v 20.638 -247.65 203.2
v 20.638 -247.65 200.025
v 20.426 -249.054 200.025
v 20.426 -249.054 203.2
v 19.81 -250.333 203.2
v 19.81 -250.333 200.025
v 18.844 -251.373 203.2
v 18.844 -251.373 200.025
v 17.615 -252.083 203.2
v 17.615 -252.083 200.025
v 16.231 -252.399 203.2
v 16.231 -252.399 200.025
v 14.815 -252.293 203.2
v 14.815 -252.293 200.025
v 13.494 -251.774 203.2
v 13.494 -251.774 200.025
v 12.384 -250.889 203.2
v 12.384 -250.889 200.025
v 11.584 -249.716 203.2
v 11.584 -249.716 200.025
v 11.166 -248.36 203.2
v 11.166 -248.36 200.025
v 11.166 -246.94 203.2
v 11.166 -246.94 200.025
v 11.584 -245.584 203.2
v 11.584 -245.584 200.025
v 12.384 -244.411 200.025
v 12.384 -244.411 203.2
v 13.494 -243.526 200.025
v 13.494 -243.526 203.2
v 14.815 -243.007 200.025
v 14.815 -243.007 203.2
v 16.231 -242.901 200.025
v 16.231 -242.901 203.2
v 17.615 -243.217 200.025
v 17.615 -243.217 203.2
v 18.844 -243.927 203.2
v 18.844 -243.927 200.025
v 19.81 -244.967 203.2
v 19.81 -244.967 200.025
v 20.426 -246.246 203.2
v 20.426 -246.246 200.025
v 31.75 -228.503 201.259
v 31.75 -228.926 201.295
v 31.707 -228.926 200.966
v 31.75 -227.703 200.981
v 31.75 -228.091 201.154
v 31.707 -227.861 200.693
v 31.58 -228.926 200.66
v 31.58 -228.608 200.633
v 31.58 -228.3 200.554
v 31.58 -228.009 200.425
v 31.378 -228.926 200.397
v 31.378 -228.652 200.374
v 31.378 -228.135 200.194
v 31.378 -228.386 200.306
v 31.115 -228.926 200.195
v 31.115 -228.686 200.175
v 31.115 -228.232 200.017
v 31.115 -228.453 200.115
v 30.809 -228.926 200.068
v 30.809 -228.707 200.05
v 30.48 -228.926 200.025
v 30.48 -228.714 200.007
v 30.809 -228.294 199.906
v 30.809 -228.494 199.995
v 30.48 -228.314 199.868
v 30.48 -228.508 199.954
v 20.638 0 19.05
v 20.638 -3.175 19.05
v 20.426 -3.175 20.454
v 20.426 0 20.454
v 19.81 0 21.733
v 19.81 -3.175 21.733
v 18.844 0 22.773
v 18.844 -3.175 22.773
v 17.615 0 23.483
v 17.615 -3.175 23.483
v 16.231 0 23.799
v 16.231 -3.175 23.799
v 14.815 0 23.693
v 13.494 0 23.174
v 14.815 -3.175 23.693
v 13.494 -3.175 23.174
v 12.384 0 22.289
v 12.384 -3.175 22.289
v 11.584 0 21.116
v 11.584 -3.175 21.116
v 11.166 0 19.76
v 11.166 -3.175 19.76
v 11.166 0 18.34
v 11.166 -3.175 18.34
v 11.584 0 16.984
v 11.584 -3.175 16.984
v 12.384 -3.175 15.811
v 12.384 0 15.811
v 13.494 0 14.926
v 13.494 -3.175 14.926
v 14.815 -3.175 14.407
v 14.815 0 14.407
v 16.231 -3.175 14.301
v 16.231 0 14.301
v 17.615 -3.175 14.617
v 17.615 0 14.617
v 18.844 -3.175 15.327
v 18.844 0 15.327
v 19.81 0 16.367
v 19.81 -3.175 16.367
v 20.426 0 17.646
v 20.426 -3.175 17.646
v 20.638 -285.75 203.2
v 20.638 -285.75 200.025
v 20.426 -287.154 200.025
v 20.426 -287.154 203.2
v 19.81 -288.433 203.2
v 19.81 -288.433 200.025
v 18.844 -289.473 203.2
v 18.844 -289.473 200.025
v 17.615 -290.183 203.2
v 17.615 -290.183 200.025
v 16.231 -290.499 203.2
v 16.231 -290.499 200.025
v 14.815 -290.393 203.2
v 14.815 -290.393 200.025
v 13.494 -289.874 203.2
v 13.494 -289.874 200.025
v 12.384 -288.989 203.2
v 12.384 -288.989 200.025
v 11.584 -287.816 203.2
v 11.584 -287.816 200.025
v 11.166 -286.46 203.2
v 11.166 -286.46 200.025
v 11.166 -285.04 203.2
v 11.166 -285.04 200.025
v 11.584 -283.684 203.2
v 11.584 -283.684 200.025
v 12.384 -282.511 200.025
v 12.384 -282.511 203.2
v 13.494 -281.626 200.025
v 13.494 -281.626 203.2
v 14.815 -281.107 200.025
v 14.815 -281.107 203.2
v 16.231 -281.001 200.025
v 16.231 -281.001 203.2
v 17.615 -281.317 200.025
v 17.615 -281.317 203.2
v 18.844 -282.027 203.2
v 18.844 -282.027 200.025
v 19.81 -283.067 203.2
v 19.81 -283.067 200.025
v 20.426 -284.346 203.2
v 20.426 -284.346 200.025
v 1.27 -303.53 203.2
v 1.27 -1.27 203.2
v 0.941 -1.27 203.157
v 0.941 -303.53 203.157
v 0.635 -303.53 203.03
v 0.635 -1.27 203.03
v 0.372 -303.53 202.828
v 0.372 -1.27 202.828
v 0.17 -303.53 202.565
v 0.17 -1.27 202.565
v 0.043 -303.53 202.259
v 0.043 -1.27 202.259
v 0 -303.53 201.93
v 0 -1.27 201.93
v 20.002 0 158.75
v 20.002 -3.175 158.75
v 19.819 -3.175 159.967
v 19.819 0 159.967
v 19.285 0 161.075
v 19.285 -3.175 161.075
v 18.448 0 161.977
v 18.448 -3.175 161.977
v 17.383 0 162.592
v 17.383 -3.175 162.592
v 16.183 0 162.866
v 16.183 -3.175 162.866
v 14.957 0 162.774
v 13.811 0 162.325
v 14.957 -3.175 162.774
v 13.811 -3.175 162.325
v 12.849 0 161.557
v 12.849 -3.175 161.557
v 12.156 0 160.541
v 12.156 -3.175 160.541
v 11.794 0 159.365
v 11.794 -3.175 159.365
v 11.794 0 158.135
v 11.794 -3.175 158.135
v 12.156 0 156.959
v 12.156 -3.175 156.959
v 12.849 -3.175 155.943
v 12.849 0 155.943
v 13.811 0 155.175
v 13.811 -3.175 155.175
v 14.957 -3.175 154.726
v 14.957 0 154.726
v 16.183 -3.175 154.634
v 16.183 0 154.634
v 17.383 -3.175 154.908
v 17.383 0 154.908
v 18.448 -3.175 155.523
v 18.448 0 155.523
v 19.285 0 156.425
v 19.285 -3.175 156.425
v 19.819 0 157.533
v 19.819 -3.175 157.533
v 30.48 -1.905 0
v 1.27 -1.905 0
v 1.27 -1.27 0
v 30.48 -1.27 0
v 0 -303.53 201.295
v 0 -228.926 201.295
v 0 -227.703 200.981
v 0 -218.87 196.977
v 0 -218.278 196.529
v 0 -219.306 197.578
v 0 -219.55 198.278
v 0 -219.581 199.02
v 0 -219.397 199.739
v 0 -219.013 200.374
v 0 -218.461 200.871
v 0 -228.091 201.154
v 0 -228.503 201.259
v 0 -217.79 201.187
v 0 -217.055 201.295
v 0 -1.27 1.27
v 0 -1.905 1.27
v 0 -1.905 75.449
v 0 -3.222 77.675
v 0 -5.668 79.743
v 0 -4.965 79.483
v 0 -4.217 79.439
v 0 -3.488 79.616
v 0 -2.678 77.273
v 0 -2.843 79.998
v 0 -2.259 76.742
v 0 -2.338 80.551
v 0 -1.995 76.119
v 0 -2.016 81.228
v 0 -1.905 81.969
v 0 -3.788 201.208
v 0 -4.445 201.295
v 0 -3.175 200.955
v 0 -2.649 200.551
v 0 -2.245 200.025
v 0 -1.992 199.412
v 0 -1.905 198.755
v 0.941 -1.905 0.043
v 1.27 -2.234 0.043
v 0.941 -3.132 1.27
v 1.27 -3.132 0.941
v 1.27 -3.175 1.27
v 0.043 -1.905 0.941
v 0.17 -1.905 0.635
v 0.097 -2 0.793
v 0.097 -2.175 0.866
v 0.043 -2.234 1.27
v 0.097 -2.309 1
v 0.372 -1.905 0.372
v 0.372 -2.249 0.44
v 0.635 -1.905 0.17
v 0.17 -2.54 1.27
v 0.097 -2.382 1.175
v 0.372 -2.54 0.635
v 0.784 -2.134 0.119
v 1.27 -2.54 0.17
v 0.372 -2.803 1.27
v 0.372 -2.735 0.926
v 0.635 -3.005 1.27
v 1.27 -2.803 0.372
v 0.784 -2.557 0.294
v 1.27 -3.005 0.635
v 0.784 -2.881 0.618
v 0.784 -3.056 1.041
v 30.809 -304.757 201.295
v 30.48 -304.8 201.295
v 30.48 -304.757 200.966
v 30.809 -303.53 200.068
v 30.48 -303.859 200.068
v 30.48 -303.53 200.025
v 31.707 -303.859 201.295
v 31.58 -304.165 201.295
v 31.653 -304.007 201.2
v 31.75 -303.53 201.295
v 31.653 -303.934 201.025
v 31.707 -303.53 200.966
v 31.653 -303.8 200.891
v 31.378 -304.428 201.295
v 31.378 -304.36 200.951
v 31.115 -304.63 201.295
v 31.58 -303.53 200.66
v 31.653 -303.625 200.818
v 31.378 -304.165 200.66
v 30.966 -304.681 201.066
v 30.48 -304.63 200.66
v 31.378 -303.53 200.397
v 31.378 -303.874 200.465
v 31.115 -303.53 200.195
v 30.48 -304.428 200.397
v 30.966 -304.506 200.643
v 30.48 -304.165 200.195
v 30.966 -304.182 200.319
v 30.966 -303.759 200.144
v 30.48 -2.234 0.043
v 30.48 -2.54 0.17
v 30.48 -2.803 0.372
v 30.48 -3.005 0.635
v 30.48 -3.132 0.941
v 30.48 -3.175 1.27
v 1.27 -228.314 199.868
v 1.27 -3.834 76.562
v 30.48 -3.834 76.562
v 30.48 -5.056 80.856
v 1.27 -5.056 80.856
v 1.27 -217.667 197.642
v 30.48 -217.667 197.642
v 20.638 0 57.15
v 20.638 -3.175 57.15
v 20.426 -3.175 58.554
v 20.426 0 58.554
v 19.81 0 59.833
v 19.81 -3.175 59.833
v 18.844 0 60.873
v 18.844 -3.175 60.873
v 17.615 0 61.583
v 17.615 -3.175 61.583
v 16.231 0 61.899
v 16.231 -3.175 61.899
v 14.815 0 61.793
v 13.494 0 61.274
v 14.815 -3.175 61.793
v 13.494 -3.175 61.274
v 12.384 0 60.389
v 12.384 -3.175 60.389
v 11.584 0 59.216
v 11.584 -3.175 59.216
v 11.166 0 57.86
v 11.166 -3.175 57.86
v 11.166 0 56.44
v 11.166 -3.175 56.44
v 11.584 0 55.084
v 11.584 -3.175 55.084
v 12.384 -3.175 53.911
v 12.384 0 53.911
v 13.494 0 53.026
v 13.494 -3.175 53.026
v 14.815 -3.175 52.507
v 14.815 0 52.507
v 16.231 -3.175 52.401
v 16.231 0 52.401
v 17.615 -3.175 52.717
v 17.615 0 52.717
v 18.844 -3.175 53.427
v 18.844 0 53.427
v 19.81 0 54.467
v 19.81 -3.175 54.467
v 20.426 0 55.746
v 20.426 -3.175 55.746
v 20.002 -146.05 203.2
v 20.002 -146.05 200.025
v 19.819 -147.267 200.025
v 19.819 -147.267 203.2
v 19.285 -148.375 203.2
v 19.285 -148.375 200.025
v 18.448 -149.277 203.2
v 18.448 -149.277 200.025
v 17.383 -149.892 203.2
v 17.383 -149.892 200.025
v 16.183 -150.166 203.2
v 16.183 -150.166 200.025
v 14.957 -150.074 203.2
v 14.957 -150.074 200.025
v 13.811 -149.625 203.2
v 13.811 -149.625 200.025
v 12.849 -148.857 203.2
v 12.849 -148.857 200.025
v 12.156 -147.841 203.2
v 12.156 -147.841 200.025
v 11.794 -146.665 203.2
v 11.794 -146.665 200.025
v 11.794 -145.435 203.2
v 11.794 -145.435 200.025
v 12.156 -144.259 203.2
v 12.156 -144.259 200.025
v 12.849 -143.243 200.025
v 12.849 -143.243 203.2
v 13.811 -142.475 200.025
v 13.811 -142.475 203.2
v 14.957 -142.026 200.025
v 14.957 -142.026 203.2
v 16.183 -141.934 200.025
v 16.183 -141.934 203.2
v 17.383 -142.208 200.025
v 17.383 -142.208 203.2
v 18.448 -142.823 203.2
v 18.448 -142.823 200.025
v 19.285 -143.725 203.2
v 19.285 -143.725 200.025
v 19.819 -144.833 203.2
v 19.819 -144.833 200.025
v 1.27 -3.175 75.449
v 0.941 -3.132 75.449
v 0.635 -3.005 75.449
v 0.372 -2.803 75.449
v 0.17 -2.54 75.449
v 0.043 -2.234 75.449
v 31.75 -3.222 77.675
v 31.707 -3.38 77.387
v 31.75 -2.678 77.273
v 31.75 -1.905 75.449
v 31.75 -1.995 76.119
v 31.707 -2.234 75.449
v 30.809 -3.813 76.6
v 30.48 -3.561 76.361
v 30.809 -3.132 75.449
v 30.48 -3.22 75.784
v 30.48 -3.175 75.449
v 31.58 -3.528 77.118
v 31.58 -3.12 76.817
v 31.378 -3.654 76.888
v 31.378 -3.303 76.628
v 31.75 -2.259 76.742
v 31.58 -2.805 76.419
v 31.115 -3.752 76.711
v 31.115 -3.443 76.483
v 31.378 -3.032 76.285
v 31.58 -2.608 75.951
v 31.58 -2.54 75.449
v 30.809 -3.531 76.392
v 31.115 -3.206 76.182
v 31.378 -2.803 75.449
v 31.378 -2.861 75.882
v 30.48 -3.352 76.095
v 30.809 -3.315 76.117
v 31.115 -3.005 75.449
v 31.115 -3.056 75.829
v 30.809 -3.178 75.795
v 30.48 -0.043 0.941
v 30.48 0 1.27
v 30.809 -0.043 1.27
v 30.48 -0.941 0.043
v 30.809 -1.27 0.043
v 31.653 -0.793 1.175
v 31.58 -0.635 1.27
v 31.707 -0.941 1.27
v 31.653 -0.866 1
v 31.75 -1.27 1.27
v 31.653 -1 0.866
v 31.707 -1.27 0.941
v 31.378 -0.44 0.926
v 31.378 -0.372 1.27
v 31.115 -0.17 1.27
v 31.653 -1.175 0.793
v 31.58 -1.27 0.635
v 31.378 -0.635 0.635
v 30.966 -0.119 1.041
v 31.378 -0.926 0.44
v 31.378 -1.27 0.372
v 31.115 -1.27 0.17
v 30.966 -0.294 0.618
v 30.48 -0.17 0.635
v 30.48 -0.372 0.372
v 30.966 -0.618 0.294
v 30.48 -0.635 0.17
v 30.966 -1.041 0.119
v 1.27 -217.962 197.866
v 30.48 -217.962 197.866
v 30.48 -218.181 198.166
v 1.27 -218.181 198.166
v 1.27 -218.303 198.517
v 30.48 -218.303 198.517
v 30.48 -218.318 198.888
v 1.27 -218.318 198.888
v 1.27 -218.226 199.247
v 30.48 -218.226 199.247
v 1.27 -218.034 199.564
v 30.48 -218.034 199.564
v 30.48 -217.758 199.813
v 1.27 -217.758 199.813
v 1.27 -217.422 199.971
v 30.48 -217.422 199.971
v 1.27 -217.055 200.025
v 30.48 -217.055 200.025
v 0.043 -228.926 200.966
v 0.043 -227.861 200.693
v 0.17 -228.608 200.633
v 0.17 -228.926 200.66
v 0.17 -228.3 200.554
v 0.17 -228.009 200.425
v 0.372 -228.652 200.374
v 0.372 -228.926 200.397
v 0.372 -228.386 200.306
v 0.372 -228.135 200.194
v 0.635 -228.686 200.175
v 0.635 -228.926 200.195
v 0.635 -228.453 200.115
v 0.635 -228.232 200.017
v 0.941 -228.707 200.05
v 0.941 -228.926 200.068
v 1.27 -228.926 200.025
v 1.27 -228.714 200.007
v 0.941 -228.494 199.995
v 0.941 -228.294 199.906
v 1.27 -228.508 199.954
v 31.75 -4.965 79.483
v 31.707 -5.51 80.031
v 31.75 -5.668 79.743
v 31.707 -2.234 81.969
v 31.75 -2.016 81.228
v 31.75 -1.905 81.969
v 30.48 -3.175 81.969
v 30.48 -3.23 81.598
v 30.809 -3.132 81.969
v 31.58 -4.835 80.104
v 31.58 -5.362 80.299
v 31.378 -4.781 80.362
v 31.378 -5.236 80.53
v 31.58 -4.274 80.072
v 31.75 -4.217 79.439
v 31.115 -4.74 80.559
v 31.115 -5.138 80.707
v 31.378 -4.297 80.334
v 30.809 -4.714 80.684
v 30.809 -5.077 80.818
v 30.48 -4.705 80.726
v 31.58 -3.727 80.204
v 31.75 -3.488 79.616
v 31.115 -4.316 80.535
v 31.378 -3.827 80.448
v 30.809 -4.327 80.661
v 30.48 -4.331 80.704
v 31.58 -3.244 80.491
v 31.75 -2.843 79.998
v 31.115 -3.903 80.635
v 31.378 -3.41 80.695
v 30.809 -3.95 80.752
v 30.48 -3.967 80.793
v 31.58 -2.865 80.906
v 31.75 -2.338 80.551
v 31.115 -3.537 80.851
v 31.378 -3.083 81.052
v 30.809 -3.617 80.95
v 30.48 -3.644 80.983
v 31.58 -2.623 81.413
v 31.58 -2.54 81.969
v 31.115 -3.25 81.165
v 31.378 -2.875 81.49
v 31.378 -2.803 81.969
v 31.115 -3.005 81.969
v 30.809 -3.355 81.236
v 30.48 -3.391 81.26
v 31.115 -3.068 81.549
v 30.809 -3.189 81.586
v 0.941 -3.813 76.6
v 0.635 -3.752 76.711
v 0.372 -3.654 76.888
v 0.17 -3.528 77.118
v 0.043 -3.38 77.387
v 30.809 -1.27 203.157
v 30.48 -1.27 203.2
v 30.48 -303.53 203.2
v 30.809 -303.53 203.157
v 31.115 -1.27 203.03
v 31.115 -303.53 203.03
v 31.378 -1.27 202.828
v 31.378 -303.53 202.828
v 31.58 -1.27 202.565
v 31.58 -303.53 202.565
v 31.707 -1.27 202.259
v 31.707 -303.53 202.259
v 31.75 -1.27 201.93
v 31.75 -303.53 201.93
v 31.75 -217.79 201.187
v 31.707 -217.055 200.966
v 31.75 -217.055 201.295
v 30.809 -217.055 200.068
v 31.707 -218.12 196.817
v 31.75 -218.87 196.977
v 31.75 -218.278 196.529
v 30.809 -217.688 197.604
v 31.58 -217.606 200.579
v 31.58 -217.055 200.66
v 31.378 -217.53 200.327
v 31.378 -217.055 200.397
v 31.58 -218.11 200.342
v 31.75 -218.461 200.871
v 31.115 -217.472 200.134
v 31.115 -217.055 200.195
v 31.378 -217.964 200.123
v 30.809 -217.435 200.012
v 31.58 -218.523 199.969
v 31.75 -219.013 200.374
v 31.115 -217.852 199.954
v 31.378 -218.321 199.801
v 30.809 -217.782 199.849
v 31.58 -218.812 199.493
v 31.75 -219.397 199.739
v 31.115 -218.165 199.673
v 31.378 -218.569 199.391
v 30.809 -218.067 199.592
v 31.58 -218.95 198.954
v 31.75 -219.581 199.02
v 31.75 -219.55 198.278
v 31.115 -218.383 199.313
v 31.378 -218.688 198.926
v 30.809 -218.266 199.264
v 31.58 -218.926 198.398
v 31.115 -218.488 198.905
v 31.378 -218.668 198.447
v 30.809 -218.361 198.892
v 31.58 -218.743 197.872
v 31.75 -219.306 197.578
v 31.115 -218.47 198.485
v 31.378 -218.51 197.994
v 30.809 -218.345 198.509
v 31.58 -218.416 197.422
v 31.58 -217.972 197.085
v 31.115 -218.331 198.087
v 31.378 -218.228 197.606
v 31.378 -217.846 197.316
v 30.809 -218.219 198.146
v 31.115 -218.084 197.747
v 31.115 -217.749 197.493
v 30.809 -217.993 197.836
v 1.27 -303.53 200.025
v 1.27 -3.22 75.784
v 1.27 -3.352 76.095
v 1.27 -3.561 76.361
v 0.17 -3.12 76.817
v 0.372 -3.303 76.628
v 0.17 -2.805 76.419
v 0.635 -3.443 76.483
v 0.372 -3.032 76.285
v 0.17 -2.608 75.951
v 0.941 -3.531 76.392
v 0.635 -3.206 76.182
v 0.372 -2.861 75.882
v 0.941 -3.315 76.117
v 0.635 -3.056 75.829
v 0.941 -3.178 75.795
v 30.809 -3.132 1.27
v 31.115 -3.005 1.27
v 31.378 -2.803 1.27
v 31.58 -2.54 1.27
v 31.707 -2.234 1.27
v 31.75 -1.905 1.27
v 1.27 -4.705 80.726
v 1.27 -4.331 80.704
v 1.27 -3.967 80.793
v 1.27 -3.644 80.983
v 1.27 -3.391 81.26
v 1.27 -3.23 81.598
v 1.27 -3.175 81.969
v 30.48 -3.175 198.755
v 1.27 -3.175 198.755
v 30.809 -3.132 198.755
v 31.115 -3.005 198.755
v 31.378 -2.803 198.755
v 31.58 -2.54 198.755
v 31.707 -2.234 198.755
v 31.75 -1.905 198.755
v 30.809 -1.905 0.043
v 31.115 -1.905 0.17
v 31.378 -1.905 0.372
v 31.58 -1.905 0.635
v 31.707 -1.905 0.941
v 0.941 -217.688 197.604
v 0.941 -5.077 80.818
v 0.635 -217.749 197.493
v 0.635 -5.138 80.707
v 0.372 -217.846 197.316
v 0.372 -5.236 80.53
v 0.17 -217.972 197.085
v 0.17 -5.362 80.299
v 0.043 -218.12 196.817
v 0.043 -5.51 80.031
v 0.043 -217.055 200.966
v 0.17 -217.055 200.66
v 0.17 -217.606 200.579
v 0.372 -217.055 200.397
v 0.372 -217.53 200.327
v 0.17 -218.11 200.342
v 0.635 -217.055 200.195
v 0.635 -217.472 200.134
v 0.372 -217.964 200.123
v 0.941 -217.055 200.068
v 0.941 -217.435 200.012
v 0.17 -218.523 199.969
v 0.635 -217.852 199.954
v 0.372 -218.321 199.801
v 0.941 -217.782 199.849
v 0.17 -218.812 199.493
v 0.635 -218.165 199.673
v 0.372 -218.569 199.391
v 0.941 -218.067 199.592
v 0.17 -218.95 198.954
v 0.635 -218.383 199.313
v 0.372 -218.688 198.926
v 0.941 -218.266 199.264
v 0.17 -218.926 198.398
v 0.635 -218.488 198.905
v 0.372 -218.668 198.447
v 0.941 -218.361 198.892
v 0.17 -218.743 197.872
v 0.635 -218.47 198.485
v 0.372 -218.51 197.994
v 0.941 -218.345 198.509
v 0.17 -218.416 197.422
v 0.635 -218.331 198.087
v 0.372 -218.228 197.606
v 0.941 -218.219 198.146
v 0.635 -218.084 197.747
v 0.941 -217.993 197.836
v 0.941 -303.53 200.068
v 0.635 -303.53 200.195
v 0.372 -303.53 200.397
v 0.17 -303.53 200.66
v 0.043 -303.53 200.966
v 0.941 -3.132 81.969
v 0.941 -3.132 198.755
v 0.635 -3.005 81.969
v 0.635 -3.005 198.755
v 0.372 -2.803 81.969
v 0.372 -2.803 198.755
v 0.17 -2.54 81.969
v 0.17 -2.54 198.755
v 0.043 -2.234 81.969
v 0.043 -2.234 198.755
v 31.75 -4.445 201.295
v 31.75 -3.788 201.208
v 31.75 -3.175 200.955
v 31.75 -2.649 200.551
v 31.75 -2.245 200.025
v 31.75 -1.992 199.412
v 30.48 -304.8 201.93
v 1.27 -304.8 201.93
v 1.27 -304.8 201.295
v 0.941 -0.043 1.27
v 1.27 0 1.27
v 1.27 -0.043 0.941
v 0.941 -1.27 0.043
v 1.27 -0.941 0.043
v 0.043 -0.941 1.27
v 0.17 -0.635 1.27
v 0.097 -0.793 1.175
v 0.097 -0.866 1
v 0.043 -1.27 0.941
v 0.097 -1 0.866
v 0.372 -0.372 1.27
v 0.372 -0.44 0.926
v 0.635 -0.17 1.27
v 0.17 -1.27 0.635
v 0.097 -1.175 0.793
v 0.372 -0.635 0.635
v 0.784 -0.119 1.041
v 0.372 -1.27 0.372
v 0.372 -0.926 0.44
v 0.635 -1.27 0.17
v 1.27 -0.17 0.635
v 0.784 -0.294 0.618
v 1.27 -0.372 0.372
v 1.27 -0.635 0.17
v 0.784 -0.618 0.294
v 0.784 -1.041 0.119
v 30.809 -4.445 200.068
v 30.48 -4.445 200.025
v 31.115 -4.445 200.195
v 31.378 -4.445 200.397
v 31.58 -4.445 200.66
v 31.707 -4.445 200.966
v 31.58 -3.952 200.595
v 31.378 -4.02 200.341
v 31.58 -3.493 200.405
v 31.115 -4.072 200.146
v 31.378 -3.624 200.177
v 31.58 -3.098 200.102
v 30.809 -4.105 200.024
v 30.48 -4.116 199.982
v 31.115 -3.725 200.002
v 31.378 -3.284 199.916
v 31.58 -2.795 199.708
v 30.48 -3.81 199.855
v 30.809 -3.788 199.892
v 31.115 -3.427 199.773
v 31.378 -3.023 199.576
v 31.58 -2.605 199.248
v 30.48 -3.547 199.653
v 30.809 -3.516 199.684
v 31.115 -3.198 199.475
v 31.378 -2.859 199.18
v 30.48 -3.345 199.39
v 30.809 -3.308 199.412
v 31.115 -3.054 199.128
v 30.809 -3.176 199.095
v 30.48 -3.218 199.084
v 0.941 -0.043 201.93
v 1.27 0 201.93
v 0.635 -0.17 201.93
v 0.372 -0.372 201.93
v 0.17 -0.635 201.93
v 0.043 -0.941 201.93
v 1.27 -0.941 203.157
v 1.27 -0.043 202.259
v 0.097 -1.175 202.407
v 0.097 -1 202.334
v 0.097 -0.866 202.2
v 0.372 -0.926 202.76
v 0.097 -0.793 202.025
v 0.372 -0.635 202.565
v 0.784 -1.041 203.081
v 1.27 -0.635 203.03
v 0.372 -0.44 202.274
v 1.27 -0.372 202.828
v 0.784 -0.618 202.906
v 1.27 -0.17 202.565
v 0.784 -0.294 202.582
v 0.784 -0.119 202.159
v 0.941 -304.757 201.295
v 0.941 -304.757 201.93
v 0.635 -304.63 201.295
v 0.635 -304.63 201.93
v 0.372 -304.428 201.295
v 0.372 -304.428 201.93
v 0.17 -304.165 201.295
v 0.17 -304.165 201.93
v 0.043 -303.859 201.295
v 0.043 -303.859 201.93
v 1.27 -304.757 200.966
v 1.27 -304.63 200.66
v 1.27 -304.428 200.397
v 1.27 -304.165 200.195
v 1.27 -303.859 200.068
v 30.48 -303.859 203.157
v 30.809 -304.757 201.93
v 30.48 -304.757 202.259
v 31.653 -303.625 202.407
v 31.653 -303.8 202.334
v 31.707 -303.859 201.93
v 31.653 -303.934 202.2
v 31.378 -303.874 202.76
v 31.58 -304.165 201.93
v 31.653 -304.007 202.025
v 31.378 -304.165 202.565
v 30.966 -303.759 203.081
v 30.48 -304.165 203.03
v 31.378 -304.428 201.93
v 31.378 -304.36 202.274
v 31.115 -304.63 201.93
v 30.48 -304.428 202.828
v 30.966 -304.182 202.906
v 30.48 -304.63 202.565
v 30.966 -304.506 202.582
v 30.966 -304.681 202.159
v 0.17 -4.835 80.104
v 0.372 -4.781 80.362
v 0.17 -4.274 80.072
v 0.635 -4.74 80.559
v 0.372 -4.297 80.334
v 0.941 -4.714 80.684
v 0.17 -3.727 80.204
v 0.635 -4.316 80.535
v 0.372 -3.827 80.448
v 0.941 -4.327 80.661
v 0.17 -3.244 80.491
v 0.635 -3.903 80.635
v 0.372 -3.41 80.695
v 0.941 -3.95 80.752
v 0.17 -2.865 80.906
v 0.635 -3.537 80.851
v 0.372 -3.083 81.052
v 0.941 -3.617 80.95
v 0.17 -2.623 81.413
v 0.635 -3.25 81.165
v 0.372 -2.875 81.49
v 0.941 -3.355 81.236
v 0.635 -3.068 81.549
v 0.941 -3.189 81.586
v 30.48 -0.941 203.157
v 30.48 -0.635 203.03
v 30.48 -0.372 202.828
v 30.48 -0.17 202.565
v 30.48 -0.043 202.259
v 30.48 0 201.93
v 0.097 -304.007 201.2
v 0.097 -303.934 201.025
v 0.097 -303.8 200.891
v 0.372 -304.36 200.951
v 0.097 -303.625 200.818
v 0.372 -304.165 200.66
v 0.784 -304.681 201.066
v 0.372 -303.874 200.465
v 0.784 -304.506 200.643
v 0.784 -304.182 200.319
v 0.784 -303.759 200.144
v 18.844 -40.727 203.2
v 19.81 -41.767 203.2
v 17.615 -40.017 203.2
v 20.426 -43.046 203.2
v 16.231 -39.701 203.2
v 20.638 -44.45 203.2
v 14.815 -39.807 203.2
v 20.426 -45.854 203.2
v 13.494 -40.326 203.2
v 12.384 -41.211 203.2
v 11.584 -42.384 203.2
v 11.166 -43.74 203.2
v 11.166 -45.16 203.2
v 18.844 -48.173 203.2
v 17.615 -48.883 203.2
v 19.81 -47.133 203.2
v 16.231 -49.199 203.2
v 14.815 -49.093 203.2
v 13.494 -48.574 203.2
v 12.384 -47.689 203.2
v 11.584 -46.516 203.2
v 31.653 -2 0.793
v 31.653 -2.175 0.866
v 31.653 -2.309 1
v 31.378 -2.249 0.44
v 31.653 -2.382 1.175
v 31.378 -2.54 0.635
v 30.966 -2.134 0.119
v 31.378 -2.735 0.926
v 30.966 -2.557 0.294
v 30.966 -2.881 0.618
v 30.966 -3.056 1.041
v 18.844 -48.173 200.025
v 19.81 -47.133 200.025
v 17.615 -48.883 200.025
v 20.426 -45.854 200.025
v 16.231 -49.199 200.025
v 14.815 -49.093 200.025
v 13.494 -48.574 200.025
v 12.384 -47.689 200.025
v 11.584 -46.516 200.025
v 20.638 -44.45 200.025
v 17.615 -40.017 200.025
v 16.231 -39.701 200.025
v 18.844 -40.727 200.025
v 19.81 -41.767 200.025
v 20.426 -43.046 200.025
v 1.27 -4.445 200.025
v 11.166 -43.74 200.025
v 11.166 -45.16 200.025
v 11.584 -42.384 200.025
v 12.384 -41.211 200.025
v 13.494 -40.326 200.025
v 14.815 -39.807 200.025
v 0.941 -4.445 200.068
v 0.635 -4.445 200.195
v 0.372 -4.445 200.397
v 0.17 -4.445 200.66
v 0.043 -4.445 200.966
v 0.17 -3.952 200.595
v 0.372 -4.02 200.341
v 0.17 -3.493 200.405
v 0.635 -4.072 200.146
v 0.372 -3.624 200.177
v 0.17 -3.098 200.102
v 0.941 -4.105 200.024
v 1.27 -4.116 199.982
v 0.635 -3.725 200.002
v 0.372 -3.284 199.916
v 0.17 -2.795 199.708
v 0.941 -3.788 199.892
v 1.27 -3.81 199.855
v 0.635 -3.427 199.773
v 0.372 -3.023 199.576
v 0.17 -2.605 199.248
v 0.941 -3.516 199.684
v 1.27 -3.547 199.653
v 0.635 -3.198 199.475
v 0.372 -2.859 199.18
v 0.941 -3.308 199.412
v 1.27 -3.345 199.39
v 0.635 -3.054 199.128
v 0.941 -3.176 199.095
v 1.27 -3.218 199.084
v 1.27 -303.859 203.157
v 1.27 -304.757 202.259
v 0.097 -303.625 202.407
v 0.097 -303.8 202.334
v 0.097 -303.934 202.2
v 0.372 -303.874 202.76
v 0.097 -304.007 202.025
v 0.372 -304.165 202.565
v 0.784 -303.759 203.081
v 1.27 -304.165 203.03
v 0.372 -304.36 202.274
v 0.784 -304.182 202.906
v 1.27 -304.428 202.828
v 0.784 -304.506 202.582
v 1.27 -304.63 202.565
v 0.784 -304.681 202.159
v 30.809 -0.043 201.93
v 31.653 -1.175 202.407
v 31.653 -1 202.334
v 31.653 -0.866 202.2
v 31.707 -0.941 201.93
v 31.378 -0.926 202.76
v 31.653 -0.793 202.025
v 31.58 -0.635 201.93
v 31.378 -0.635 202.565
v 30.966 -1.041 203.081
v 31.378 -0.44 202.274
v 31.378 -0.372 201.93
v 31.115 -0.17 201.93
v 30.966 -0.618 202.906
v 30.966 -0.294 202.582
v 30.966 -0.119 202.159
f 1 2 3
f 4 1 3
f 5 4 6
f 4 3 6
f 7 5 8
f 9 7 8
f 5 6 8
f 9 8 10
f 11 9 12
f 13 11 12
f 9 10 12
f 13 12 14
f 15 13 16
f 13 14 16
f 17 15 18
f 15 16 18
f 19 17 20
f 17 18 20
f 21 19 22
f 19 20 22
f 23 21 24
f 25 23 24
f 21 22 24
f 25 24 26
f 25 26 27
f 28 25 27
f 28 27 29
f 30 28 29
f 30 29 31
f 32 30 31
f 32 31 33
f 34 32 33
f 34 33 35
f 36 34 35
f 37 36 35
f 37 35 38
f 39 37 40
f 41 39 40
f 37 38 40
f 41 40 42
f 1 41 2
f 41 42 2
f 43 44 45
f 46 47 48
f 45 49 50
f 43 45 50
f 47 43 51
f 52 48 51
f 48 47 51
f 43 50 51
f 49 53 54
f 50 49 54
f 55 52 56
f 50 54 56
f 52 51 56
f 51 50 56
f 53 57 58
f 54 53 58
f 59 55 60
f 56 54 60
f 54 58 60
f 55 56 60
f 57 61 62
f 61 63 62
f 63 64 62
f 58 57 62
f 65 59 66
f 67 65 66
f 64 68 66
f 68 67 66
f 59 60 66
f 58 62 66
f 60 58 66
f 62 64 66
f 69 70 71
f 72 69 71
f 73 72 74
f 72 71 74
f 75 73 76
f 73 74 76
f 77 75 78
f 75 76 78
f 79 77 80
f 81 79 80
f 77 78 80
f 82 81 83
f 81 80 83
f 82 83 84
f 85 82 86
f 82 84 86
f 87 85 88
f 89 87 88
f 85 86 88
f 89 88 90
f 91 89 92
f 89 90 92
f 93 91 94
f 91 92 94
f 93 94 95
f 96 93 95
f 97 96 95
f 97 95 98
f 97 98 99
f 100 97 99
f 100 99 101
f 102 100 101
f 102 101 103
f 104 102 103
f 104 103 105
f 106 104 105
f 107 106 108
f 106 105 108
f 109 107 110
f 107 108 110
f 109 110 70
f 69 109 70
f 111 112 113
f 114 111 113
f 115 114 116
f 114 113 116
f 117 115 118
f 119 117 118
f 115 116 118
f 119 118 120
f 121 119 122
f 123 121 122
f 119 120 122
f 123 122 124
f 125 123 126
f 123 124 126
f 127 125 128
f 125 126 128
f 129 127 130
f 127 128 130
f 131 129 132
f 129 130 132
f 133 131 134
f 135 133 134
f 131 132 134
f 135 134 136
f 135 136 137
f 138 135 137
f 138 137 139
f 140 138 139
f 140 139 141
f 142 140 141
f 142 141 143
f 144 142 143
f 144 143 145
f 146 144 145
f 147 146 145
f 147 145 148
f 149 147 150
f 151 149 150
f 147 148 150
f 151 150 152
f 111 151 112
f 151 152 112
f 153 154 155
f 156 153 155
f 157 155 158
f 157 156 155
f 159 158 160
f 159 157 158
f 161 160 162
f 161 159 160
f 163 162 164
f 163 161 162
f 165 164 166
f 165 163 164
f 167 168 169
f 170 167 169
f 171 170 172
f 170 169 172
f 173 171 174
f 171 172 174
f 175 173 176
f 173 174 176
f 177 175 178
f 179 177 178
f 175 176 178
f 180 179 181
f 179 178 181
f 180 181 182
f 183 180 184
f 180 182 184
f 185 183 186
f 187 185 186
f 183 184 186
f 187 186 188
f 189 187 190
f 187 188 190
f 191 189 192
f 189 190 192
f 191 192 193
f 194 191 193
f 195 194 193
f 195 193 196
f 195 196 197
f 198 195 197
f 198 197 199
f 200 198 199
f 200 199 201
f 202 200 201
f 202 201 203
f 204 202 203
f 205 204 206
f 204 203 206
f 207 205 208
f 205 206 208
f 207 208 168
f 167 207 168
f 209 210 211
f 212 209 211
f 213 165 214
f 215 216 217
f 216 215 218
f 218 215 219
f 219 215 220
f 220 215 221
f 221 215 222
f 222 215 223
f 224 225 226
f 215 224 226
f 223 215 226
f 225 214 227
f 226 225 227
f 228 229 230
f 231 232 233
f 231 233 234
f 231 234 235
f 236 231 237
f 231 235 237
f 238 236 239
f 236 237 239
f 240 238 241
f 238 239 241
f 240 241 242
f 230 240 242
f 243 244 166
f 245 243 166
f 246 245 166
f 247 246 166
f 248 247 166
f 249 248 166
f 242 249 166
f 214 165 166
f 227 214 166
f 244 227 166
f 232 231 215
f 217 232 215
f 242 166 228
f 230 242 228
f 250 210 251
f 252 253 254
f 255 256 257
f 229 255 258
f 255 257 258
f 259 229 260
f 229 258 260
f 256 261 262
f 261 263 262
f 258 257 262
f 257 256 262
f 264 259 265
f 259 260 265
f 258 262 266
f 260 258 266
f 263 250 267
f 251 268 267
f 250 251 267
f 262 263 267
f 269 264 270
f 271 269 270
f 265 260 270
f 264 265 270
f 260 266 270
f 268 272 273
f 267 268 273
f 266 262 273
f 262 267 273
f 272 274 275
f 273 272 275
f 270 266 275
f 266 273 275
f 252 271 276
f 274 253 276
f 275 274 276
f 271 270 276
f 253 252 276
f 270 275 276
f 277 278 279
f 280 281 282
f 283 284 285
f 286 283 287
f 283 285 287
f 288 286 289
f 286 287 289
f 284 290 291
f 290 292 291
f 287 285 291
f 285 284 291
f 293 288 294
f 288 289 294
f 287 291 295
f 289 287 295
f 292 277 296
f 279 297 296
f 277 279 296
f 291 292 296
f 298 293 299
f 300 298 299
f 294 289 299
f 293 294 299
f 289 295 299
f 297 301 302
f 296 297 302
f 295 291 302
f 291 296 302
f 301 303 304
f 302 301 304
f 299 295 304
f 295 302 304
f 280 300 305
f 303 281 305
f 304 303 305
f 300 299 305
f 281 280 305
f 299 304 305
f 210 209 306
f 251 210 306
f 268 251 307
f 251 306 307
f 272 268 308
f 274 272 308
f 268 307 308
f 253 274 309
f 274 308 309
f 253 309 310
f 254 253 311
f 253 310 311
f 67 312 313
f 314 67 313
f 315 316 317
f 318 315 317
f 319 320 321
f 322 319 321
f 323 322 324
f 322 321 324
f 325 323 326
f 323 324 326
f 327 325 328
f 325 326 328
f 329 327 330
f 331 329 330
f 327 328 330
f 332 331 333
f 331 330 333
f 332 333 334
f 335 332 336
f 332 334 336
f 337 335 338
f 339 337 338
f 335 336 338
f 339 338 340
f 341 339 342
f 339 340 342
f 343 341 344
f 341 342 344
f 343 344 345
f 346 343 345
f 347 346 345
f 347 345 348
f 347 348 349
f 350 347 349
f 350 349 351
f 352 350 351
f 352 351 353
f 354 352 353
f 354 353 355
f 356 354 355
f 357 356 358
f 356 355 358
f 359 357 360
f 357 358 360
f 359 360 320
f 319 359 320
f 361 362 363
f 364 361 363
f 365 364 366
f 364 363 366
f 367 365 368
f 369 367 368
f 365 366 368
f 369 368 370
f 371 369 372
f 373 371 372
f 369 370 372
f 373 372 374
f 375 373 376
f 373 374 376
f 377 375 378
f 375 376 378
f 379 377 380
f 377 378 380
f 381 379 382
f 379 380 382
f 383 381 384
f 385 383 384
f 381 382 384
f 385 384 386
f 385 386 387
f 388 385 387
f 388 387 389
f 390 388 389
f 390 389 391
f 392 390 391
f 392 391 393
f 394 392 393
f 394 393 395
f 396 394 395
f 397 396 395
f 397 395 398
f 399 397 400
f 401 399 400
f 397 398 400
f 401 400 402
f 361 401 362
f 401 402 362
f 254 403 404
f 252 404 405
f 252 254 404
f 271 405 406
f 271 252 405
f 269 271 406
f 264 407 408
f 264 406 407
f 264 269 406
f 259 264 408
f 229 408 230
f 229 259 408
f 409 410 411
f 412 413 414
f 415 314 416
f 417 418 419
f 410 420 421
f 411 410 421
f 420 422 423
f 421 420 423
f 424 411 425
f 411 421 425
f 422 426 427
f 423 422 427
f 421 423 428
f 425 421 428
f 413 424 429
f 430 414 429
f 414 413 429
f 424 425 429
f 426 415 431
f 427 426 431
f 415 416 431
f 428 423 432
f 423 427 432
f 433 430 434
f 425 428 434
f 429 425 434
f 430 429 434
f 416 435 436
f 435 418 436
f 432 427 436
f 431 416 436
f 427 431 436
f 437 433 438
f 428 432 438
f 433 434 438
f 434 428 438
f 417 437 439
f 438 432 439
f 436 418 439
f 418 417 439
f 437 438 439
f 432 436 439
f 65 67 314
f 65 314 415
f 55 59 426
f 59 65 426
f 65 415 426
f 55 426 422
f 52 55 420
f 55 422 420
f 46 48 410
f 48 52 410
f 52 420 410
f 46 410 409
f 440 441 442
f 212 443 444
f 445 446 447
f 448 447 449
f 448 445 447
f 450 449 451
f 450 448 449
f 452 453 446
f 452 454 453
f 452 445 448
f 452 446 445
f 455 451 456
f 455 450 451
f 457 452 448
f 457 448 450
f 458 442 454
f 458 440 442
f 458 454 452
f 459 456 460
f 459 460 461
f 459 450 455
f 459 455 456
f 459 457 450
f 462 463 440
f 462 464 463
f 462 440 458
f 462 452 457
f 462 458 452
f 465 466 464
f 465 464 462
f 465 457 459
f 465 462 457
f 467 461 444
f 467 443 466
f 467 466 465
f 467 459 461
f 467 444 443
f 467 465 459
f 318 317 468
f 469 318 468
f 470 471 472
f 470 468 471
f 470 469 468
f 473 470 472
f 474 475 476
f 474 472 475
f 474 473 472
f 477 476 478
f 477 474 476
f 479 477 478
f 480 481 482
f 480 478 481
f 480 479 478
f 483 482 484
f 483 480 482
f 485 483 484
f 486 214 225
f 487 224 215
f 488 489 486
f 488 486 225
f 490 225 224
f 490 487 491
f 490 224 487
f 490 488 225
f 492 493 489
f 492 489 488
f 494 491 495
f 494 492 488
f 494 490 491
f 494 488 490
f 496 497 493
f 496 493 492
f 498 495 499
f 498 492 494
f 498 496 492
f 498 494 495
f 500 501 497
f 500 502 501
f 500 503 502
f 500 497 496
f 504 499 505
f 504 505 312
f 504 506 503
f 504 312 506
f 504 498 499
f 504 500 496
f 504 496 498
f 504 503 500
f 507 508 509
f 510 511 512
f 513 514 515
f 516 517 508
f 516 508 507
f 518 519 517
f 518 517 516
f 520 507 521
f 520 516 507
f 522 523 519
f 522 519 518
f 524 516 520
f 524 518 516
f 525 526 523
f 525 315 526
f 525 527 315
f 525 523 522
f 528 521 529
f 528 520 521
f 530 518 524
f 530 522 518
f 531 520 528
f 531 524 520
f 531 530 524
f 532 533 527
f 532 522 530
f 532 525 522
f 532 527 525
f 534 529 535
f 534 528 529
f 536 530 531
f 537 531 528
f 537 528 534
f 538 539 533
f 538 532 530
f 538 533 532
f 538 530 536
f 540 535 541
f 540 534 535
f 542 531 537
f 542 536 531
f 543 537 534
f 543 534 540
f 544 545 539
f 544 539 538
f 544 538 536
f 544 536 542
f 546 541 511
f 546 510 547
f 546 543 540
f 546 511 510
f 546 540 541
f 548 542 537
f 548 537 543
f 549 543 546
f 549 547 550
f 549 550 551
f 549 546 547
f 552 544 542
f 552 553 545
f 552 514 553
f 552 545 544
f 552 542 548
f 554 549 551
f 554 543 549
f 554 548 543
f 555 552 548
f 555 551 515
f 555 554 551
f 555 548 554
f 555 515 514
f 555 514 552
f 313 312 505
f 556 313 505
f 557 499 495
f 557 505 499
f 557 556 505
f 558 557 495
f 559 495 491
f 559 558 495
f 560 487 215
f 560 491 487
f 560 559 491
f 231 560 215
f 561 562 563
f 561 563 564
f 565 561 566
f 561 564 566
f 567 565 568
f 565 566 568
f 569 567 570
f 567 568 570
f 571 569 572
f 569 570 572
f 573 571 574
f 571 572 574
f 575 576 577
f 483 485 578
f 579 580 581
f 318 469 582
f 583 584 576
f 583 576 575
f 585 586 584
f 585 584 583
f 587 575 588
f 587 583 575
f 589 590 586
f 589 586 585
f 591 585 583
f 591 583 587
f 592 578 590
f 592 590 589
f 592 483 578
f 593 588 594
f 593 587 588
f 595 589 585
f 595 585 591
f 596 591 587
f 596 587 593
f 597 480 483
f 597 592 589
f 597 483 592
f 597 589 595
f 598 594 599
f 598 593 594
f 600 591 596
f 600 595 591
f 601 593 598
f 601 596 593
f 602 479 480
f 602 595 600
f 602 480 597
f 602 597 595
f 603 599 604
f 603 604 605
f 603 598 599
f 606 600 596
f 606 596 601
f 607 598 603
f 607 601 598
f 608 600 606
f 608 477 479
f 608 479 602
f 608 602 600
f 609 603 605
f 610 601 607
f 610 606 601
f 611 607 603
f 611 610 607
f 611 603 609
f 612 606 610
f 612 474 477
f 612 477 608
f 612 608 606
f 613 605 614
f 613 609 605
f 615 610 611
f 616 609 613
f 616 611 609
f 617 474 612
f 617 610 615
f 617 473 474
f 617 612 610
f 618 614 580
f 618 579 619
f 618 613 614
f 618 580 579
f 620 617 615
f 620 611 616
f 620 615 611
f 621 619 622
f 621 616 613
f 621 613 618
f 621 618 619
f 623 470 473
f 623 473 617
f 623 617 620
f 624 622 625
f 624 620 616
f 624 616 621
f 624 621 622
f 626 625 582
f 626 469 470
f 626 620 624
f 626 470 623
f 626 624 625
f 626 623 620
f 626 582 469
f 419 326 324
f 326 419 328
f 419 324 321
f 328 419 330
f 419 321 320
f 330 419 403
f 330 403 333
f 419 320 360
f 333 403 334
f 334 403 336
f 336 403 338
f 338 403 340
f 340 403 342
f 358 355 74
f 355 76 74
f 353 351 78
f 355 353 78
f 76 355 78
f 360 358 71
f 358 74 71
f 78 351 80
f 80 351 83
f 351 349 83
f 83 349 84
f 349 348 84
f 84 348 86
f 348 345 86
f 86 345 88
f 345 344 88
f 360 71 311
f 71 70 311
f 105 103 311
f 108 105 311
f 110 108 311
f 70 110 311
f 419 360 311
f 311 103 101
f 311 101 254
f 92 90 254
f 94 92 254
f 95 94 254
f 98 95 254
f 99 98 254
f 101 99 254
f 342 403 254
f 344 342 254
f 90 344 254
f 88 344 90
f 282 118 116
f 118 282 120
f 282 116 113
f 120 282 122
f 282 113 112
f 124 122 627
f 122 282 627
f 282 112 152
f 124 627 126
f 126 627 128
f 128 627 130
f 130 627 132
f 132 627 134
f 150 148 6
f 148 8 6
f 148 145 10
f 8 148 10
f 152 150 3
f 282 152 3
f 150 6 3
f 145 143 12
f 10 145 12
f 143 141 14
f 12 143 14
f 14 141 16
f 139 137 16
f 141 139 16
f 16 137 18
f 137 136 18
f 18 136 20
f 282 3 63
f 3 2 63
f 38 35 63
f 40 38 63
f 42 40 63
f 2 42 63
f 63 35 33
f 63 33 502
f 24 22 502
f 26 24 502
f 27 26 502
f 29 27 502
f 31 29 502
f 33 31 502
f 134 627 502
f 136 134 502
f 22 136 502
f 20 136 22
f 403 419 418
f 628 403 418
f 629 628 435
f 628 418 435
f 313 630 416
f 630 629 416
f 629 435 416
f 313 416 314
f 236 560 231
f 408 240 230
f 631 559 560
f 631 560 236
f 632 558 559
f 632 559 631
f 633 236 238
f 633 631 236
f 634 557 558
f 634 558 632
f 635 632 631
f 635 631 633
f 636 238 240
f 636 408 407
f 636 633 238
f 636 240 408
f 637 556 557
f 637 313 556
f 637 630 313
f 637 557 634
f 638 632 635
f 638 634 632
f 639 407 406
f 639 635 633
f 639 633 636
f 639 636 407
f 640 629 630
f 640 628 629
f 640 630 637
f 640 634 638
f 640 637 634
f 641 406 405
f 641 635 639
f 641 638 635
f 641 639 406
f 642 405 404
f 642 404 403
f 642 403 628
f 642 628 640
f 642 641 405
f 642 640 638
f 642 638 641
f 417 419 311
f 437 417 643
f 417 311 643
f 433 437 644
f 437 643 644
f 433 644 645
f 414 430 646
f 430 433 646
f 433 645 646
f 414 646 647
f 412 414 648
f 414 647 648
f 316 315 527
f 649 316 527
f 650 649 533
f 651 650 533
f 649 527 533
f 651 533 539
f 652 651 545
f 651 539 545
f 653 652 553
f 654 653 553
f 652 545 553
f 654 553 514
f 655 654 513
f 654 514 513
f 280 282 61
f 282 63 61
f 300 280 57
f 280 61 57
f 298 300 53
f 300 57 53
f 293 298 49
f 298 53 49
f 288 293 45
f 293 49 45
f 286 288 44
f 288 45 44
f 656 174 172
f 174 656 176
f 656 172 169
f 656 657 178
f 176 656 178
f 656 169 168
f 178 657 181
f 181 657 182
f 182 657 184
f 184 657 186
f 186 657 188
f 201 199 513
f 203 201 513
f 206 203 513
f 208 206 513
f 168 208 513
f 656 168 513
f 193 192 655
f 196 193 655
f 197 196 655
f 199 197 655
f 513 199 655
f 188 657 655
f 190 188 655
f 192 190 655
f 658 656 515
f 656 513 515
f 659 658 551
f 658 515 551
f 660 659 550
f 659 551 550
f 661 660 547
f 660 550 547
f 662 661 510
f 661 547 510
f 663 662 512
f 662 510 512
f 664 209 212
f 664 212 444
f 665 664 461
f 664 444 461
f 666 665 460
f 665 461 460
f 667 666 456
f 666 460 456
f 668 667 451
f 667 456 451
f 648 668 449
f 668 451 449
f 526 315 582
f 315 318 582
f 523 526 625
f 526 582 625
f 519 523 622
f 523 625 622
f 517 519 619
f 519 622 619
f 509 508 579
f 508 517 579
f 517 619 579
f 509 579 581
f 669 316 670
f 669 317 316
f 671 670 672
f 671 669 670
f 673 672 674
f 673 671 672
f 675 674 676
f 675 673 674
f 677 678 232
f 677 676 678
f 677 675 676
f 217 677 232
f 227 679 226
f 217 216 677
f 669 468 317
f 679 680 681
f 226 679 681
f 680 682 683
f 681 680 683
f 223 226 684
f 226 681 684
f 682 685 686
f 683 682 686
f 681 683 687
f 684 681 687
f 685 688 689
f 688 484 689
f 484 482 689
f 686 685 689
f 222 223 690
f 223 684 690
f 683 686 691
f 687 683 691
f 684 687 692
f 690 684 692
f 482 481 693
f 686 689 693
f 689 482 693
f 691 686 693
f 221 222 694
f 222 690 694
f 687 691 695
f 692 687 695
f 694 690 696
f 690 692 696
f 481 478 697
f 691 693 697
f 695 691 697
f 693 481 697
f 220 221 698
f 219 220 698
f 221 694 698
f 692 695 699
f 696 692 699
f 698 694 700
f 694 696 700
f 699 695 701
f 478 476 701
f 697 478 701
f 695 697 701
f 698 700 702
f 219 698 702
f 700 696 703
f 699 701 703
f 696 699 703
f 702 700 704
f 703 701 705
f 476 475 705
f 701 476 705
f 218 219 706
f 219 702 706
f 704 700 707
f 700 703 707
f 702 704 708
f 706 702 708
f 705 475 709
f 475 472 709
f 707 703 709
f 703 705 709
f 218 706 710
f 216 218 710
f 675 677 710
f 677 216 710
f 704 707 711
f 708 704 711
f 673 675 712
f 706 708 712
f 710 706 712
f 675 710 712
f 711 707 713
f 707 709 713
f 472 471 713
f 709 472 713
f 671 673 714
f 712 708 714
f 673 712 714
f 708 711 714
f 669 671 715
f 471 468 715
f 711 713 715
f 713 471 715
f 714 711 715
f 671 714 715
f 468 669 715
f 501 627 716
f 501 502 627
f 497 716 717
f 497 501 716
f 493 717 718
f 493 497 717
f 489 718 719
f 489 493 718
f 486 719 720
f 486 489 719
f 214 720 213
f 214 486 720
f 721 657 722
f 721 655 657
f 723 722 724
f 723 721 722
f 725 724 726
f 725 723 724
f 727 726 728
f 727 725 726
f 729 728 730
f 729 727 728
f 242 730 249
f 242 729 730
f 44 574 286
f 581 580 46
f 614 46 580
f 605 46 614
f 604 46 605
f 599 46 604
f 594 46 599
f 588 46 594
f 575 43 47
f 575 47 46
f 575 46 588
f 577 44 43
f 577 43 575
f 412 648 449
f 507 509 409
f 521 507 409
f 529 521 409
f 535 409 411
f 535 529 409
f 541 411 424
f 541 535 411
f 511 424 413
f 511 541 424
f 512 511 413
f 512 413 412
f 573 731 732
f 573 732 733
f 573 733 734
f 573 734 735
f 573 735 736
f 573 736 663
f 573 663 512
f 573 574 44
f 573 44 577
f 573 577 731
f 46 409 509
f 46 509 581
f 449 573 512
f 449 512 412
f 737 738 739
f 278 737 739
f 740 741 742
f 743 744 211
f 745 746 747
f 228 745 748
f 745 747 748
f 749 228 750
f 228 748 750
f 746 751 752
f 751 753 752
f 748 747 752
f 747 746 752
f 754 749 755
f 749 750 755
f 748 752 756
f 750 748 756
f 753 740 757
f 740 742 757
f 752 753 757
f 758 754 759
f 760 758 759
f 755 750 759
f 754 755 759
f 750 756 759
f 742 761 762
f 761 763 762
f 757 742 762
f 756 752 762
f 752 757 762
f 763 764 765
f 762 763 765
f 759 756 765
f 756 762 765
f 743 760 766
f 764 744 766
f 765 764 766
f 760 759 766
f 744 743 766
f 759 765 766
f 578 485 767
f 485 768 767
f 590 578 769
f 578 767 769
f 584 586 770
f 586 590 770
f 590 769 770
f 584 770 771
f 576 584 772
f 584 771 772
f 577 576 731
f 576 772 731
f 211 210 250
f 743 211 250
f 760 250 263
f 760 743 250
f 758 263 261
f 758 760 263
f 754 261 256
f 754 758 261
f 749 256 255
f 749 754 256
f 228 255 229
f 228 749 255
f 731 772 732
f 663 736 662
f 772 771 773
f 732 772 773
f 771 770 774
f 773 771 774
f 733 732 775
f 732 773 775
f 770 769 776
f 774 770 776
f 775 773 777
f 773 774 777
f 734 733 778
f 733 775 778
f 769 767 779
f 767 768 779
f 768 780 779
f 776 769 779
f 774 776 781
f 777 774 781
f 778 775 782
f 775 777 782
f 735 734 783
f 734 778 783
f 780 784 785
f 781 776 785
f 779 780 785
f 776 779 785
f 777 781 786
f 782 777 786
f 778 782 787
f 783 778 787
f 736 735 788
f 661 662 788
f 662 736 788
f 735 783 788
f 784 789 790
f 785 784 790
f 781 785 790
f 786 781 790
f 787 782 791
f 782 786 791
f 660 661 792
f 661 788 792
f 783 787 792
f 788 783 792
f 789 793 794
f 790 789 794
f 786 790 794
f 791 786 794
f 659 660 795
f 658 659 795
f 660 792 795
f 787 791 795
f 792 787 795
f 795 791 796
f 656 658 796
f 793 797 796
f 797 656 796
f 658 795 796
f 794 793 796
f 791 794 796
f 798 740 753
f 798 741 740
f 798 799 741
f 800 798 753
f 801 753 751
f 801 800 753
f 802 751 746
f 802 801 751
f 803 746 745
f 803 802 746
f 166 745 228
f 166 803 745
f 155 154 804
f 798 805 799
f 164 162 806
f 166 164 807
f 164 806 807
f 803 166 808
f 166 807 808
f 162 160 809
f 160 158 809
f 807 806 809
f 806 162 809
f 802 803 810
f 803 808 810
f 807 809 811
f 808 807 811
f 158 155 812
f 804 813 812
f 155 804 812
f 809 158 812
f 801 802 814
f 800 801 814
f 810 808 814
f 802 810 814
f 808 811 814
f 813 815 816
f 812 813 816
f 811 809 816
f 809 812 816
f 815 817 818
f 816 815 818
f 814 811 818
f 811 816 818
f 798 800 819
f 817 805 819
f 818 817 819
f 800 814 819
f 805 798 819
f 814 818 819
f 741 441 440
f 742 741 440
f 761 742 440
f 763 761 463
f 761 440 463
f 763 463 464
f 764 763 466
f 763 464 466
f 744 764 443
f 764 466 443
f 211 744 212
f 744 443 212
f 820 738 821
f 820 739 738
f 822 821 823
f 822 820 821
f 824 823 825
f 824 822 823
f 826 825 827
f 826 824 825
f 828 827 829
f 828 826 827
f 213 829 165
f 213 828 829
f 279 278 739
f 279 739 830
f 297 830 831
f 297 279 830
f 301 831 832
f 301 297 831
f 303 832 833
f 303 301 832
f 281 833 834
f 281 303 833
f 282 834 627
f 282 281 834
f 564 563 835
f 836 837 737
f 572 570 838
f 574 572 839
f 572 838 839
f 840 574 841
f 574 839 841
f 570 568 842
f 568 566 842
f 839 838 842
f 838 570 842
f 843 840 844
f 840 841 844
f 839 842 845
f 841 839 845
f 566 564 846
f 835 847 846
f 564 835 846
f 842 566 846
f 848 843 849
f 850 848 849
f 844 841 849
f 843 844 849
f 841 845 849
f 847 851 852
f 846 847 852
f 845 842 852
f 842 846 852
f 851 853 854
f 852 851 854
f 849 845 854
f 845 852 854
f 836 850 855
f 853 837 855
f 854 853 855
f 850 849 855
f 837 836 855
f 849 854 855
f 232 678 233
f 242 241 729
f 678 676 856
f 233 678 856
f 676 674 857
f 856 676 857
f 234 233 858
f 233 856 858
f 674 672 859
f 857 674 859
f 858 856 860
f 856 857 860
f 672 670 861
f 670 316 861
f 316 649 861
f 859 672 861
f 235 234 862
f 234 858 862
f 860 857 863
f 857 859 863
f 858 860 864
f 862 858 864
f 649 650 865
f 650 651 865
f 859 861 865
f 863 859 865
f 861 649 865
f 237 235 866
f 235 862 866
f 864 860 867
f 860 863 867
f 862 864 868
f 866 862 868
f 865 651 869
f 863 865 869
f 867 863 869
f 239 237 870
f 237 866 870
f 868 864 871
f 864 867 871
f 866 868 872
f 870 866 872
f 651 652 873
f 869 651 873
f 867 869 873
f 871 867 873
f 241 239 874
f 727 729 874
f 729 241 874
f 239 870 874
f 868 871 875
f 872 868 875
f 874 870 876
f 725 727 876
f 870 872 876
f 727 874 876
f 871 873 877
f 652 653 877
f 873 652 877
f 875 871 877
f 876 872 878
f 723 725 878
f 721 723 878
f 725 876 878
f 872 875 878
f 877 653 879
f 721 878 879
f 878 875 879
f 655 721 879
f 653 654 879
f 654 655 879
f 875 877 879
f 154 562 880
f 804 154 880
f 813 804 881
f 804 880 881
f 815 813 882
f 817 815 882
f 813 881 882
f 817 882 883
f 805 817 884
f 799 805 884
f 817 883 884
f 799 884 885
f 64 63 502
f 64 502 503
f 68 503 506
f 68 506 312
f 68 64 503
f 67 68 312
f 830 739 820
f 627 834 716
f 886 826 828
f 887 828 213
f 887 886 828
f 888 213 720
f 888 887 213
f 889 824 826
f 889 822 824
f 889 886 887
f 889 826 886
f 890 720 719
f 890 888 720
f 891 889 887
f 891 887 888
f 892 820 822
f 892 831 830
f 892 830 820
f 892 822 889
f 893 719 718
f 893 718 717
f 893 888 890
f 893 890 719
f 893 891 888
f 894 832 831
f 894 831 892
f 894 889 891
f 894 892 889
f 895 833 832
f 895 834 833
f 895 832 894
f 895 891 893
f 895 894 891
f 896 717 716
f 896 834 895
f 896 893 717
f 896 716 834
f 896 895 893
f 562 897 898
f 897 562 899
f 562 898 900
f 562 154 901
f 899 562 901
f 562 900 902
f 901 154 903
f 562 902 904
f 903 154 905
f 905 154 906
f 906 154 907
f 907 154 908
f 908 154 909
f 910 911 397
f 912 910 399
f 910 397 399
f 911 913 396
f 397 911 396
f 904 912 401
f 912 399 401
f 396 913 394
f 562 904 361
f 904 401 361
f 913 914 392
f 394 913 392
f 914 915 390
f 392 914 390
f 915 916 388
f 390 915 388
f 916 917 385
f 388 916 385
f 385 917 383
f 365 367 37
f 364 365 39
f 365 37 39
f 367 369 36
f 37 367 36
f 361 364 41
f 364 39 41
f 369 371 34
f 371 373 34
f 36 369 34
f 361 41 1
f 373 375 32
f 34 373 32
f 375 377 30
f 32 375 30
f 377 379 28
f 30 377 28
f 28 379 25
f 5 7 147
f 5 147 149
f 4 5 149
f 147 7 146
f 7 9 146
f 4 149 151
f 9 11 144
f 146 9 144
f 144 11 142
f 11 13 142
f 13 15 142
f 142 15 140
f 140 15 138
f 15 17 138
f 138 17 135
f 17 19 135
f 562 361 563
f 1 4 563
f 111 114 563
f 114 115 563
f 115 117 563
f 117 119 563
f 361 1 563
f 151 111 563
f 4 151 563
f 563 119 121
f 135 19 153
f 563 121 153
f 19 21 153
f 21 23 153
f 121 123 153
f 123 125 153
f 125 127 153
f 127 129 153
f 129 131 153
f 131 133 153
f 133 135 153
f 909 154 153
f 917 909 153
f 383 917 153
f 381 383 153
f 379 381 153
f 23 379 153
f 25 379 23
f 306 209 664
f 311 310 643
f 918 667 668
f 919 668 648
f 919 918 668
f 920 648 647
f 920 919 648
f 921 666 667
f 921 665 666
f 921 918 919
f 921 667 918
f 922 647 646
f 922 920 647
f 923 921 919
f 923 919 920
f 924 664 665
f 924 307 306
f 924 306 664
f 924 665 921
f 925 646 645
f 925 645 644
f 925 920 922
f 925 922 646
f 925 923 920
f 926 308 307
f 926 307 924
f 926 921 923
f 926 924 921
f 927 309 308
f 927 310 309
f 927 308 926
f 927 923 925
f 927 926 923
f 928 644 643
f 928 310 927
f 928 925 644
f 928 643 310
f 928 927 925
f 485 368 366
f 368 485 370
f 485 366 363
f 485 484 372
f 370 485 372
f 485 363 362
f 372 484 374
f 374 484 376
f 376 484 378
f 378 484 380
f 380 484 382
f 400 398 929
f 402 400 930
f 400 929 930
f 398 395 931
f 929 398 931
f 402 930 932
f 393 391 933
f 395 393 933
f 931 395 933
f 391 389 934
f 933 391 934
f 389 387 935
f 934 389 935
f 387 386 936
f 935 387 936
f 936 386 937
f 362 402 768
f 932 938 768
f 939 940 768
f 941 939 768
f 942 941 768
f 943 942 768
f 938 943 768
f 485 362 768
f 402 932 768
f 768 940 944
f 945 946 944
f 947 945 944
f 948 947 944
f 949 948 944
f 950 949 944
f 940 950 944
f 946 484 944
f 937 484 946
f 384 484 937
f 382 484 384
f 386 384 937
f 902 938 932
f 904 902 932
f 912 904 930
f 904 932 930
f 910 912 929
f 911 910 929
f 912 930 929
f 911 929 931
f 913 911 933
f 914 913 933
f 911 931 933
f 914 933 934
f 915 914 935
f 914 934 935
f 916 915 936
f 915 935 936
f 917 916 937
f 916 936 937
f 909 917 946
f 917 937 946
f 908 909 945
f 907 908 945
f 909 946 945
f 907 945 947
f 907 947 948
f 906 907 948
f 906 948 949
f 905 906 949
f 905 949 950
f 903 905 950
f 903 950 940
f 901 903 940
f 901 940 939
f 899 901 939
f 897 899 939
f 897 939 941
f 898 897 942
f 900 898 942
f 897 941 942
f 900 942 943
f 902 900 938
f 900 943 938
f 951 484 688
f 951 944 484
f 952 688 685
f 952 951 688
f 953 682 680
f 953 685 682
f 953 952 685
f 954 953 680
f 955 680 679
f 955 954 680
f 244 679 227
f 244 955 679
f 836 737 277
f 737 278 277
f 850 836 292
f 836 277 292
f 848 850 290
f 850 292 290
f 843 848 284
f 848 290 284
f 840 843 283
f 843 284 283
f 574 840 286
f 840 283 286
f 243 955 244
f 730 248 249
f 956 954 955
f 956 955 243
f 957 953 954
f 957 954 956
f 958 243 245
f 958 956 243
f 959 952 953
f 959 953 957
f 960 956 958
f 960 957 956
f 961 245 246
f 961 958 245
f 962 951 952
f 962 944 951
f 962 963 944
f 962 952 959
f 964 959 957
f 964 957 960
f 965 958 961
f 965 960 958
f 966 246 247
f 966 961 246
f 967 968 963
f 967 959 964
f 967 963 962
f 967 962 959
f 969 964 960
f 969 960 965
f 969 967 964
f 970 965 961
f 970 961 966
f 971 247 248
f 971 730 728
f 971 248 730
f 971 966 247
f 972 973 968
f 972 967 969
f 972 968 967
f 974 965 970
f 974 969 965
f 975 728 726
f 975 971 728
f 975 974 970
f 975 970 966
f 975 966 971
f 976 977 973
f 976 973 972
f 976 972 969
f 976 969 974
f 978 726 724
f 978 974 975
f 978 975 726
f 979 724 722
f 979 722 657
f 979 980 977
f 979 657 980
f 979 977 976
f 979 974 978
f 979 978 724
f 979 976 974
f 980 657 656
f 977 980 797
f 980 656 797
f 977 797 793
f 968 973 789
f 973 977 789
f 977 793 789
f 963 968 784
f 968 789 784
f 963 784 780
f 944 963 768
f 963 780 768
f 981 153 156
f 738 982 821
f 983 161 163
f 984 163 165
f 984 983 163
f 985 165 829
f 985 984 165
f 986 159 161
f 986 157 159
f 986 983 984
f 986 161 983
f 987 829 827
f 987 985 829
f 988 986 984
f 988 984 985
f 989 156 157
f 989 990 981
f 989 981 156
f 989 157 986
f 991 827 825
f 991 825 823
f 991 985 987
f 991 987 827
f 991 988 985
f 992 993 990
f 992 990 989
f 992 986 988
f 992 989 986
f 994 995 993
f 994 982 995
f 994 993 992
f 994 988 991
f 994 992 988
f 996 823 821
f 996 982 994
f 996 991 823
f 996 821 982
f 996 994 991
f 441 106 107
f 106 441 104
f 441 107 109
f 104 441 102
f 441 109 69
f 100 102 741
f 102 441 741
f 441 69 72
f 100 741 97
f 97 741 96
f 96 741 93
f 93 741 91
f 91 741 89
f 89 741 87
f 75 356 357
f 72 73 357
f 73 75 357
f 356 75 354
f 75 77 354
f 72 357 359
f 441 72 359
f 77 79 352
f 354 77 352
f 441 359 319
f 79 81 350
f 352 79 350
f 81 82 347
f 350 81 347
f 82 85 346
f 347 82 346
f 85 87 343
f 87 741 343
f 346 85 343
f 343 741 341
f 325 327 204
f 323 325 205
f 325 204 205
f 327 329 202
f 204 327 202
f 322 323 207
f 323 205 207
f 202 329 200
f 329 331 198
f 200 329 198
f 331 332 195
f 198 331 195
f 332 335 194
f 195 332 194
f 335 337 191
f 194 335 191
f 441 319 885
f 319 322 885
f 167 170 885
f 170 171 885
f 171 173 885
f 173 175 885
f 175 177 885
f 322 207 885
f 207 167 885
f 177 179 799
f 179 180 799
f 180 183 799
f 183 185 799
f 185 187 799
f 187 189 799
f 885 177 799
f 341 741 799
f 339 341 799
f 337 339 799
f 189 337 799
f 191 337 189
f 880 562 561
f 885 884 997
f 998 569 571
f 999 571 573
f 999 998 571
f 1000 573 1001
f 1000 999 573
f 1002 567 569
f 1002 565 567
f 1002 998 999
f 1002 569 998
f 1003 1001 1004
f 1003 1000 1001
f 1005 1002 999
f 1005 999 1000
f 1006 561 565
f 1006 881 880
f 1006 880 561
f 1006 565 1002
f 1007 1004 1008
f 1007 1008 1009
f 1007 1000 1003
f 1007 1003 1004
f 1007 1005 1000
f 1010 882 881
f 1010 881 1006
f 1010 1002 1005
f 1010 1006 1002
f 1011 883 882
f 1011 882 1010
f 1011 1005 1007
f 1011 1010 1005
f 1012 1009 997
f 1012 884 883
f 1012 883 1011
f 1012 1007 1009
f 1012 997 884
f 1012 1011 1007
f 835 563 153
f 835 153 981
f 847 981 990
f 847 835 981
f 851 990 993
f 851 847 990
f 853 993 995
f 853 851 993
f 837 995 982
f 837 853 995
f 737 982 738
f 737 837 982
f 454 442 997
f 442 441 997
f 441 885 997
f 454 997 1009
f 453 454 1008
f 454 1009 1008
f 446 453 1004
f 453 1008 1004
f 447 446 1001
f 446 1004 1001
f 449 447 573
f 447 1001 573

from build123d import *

# Parameters (mm, degrees)
F1_DEPTH = 31.75
F3_R     = 1.27
F4_R     = 4.7625
F4_R_2   = 4.1275
F5_DEPTH = 3.175
F6_R     = 4.7625
F6_R_2   = 4.1275
F7_DEPTH = 3.175


# Not quite as in the source:
# - a feature of the source that left no trace in its solid (it failed there, or was rolled back) is left out


with BuildPart() as f1:
    # F0 (on Right) → F1 (new body)
    with BuildSketch(Plane.YZ):
        Polygon((0, 203.2), (-304.8, 203.2), (-304.8, 200.025), (-228.6, 200.025), (-3.175, 76.2), (-3.175, 0), (0, 0), align=None)
        Polygon((-222.0052667175, 200.025), (-3.175, 200.025), (-3.175, 79.822459127), align=None, mode=Mode.SUBTRACT)
    extrude(amount=F1_DEPTH)

    # F3
    f3_edges = [f1.edges().sort_by_distance(p)[0] for p in [
        (15.875, -3.175, 79.822459),
        (15.875, -222.005267, 200.025),
        (15.875, -3.175, 200.025),
        (15.875, 0, 203.2),
        (15.875, -304.8, 203.2),
        (0, -152.4, 203.2),
        (31.75, -152.4, 203.2),
        (15.875, -304.8, 200.025),
        (0, -304.8, 201.6125),
        (31.75, -304.8, 201.6125),
        (0, -112.590133, 200.025),
        (31.75, -112.590133, 200.025),
        (15.875, 0, 0),
        (0, 0, 101.6),
        (31.75, 0, 101.6),
        (15.875, -3.175, 0),
        (0, -1.5875, 0),
        (31.75, -1.5875, 0),
        (15.875, -228.6, 200.025),
        (0, -266.7, 200.025),
        (31.75, -266.7, 200.025),
        (15.875, -3.175, 76.2),
        (0, -115.8875, 138.1125),
        (31.75, -115.8875, 138.1125),
        (0, -3.175, 38.1),
        (31.75, -3.175, 38.1),
        (0, -112.590133, 139.92373),
        (31.75, -112.590133, 139.92373),
        (0, -3.175, 139.92373),
        (31.75, -3.175, 139.92373),
    ]]
    fillet(f3_edges, radius=F3_R)

    # F4 (on face) → F5 (cut, through all)
    with BuildSketch(Plane(origin=(0, 0, 200.025), x_dir=(1, 0, 0), z_dir=(0, 0, -1))):
        with Locations((15.875, 285.75)):
            Circle(F4_R)
        with Locations((15.875, 247.65)):
            Circle(F4_R)
        with Locations((15.875, 146.05)):
            Circle(F4_R_2)
        with Locations((15.875, 44.45)):
            Circle(F4_R)
    extrude(amount=-F5_DEPTH, mode=Mode.SUBTRACT)

    # F6 (on face) → F7 (cut, through all)
    with BuildSketch(Plane.XZ.offset(3.175)):
        with Locations((15.875, 57.15)):
            Circle(F6_R)
        with Locations((15.875, 19.05)):
            Circle(F6_R)
        with Locations((15.875, 158.75)):
            Circle(F6_R_2)
    extrude(amount=-F7_DEPTH, mode=Mode.SUBTRACT)


solid = f1.part
